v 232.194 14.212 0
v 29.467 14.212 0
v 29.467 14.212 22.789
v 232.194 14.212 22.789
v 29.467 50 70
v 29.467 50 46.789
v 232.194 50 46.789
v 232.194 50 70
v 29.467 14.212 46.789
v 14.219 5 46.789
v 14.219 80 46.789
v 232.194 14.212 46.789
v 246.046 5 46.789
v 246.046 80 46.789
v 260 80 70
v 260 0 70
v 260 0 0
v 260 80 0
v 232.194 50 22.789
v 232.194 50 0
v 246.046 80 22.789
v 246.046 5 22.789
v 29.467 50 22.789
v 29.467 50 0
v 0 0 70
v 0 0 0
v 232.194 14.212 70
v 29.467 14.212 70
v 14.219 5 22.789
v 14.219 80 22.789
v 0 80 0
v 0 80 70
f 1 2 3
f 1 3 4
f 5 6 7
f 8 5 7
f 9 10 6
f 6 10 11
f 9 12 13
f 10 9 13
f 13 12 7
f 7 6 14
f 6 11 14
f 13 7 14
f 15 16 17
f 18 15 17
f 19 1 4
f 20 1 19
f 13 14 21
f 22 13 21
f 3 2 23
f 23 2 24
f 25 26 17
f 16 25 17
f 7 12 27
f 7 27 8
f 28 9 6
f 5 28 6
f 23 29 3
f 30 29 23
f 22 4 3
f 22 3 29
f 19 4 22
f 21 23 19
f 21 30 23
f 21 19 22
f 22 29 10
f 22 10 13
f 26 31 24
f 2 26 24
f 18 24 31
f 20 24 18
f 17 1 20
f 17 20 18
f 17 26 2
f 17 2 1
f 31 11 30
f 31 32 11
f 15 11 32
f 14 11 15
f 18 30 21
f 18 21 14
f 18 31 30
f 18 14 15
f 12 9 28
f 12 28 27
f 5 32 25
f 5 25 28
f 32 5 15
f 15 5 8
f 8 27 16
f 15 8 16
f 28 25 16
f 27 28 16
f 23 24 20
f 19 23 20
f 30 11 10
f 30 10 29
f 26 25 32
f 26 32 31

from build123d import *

# Parameters (mm, degrees)
ESQUISSE1_W                  = 260
ESQUISSE1_H                  = 70
BOSS_EXTRU_1_DEPTH           = 80
ENL_V_MAT_EXTRU_1_DEPTH      = 236
ENL_V_MAT_EXTRU_1_DEPTH_BACK = 80
ESQUISSE3_W                  = 202.727222796
ESQUISSE3_H                  = 35.788236333
ESQUISSE4_W                  = 231.827281701
ESQUISSE4_H                  = 24
ENL_V_MAT_EXTRU_2_DEPTH      = 75


with BuildPart() as part:
    # Esquisse1 → Boss.-Extru.1 (new body)
    with BuildSketch(Plane(origin=(0, 0, 0), x_dir=(1, 0, 0), z_dir=(0, 1, 0))):
        with Locations((130, -35)):
            Rectangle(ESQUISSE1_W, ESQUISSE1_H)
    extrude(amount=BOSS_EXTRU_1_DEPTH)

    # Esquisse3 → Enlèv. mat.-Extru.1 (cut, two sides: drawn at the far end of the back side and taken through both)
    with BuildSketch(Plane.XY.offset(70).offset(-ENL_V_MAT_EXTRU_1_DEPTH_BACK)):
        with Locations((130.830849274, 32.105881833)):
            Rectangle(ESQUISSE3_W, ESQUISSE3_H)
    extrude(amount=ENL_V_MAT_EXTRU_1_DEPTH + ENL_V_MAT_EXTRU_1_DEPTH_BACK, mode=Mode.SUBTRACT)

    # Esquisse4 → Enlèv. mat.-Extru.2 (cut)
    with BuildSketch(Plane(origin=(0, 80, 0), x_dir=(1, 0, 0), z_dir=(0, 1, 0))):
        with Locations((130.132710296, -34.788590838)):
            Rectangle(ESQUISSE4_W, ESQUISSE4_H)
    extrude(amount=-ENL_V_MAT_EXTRU_2_DEPTH, mode=Mode.SUBTRACT)


solid = part.part
